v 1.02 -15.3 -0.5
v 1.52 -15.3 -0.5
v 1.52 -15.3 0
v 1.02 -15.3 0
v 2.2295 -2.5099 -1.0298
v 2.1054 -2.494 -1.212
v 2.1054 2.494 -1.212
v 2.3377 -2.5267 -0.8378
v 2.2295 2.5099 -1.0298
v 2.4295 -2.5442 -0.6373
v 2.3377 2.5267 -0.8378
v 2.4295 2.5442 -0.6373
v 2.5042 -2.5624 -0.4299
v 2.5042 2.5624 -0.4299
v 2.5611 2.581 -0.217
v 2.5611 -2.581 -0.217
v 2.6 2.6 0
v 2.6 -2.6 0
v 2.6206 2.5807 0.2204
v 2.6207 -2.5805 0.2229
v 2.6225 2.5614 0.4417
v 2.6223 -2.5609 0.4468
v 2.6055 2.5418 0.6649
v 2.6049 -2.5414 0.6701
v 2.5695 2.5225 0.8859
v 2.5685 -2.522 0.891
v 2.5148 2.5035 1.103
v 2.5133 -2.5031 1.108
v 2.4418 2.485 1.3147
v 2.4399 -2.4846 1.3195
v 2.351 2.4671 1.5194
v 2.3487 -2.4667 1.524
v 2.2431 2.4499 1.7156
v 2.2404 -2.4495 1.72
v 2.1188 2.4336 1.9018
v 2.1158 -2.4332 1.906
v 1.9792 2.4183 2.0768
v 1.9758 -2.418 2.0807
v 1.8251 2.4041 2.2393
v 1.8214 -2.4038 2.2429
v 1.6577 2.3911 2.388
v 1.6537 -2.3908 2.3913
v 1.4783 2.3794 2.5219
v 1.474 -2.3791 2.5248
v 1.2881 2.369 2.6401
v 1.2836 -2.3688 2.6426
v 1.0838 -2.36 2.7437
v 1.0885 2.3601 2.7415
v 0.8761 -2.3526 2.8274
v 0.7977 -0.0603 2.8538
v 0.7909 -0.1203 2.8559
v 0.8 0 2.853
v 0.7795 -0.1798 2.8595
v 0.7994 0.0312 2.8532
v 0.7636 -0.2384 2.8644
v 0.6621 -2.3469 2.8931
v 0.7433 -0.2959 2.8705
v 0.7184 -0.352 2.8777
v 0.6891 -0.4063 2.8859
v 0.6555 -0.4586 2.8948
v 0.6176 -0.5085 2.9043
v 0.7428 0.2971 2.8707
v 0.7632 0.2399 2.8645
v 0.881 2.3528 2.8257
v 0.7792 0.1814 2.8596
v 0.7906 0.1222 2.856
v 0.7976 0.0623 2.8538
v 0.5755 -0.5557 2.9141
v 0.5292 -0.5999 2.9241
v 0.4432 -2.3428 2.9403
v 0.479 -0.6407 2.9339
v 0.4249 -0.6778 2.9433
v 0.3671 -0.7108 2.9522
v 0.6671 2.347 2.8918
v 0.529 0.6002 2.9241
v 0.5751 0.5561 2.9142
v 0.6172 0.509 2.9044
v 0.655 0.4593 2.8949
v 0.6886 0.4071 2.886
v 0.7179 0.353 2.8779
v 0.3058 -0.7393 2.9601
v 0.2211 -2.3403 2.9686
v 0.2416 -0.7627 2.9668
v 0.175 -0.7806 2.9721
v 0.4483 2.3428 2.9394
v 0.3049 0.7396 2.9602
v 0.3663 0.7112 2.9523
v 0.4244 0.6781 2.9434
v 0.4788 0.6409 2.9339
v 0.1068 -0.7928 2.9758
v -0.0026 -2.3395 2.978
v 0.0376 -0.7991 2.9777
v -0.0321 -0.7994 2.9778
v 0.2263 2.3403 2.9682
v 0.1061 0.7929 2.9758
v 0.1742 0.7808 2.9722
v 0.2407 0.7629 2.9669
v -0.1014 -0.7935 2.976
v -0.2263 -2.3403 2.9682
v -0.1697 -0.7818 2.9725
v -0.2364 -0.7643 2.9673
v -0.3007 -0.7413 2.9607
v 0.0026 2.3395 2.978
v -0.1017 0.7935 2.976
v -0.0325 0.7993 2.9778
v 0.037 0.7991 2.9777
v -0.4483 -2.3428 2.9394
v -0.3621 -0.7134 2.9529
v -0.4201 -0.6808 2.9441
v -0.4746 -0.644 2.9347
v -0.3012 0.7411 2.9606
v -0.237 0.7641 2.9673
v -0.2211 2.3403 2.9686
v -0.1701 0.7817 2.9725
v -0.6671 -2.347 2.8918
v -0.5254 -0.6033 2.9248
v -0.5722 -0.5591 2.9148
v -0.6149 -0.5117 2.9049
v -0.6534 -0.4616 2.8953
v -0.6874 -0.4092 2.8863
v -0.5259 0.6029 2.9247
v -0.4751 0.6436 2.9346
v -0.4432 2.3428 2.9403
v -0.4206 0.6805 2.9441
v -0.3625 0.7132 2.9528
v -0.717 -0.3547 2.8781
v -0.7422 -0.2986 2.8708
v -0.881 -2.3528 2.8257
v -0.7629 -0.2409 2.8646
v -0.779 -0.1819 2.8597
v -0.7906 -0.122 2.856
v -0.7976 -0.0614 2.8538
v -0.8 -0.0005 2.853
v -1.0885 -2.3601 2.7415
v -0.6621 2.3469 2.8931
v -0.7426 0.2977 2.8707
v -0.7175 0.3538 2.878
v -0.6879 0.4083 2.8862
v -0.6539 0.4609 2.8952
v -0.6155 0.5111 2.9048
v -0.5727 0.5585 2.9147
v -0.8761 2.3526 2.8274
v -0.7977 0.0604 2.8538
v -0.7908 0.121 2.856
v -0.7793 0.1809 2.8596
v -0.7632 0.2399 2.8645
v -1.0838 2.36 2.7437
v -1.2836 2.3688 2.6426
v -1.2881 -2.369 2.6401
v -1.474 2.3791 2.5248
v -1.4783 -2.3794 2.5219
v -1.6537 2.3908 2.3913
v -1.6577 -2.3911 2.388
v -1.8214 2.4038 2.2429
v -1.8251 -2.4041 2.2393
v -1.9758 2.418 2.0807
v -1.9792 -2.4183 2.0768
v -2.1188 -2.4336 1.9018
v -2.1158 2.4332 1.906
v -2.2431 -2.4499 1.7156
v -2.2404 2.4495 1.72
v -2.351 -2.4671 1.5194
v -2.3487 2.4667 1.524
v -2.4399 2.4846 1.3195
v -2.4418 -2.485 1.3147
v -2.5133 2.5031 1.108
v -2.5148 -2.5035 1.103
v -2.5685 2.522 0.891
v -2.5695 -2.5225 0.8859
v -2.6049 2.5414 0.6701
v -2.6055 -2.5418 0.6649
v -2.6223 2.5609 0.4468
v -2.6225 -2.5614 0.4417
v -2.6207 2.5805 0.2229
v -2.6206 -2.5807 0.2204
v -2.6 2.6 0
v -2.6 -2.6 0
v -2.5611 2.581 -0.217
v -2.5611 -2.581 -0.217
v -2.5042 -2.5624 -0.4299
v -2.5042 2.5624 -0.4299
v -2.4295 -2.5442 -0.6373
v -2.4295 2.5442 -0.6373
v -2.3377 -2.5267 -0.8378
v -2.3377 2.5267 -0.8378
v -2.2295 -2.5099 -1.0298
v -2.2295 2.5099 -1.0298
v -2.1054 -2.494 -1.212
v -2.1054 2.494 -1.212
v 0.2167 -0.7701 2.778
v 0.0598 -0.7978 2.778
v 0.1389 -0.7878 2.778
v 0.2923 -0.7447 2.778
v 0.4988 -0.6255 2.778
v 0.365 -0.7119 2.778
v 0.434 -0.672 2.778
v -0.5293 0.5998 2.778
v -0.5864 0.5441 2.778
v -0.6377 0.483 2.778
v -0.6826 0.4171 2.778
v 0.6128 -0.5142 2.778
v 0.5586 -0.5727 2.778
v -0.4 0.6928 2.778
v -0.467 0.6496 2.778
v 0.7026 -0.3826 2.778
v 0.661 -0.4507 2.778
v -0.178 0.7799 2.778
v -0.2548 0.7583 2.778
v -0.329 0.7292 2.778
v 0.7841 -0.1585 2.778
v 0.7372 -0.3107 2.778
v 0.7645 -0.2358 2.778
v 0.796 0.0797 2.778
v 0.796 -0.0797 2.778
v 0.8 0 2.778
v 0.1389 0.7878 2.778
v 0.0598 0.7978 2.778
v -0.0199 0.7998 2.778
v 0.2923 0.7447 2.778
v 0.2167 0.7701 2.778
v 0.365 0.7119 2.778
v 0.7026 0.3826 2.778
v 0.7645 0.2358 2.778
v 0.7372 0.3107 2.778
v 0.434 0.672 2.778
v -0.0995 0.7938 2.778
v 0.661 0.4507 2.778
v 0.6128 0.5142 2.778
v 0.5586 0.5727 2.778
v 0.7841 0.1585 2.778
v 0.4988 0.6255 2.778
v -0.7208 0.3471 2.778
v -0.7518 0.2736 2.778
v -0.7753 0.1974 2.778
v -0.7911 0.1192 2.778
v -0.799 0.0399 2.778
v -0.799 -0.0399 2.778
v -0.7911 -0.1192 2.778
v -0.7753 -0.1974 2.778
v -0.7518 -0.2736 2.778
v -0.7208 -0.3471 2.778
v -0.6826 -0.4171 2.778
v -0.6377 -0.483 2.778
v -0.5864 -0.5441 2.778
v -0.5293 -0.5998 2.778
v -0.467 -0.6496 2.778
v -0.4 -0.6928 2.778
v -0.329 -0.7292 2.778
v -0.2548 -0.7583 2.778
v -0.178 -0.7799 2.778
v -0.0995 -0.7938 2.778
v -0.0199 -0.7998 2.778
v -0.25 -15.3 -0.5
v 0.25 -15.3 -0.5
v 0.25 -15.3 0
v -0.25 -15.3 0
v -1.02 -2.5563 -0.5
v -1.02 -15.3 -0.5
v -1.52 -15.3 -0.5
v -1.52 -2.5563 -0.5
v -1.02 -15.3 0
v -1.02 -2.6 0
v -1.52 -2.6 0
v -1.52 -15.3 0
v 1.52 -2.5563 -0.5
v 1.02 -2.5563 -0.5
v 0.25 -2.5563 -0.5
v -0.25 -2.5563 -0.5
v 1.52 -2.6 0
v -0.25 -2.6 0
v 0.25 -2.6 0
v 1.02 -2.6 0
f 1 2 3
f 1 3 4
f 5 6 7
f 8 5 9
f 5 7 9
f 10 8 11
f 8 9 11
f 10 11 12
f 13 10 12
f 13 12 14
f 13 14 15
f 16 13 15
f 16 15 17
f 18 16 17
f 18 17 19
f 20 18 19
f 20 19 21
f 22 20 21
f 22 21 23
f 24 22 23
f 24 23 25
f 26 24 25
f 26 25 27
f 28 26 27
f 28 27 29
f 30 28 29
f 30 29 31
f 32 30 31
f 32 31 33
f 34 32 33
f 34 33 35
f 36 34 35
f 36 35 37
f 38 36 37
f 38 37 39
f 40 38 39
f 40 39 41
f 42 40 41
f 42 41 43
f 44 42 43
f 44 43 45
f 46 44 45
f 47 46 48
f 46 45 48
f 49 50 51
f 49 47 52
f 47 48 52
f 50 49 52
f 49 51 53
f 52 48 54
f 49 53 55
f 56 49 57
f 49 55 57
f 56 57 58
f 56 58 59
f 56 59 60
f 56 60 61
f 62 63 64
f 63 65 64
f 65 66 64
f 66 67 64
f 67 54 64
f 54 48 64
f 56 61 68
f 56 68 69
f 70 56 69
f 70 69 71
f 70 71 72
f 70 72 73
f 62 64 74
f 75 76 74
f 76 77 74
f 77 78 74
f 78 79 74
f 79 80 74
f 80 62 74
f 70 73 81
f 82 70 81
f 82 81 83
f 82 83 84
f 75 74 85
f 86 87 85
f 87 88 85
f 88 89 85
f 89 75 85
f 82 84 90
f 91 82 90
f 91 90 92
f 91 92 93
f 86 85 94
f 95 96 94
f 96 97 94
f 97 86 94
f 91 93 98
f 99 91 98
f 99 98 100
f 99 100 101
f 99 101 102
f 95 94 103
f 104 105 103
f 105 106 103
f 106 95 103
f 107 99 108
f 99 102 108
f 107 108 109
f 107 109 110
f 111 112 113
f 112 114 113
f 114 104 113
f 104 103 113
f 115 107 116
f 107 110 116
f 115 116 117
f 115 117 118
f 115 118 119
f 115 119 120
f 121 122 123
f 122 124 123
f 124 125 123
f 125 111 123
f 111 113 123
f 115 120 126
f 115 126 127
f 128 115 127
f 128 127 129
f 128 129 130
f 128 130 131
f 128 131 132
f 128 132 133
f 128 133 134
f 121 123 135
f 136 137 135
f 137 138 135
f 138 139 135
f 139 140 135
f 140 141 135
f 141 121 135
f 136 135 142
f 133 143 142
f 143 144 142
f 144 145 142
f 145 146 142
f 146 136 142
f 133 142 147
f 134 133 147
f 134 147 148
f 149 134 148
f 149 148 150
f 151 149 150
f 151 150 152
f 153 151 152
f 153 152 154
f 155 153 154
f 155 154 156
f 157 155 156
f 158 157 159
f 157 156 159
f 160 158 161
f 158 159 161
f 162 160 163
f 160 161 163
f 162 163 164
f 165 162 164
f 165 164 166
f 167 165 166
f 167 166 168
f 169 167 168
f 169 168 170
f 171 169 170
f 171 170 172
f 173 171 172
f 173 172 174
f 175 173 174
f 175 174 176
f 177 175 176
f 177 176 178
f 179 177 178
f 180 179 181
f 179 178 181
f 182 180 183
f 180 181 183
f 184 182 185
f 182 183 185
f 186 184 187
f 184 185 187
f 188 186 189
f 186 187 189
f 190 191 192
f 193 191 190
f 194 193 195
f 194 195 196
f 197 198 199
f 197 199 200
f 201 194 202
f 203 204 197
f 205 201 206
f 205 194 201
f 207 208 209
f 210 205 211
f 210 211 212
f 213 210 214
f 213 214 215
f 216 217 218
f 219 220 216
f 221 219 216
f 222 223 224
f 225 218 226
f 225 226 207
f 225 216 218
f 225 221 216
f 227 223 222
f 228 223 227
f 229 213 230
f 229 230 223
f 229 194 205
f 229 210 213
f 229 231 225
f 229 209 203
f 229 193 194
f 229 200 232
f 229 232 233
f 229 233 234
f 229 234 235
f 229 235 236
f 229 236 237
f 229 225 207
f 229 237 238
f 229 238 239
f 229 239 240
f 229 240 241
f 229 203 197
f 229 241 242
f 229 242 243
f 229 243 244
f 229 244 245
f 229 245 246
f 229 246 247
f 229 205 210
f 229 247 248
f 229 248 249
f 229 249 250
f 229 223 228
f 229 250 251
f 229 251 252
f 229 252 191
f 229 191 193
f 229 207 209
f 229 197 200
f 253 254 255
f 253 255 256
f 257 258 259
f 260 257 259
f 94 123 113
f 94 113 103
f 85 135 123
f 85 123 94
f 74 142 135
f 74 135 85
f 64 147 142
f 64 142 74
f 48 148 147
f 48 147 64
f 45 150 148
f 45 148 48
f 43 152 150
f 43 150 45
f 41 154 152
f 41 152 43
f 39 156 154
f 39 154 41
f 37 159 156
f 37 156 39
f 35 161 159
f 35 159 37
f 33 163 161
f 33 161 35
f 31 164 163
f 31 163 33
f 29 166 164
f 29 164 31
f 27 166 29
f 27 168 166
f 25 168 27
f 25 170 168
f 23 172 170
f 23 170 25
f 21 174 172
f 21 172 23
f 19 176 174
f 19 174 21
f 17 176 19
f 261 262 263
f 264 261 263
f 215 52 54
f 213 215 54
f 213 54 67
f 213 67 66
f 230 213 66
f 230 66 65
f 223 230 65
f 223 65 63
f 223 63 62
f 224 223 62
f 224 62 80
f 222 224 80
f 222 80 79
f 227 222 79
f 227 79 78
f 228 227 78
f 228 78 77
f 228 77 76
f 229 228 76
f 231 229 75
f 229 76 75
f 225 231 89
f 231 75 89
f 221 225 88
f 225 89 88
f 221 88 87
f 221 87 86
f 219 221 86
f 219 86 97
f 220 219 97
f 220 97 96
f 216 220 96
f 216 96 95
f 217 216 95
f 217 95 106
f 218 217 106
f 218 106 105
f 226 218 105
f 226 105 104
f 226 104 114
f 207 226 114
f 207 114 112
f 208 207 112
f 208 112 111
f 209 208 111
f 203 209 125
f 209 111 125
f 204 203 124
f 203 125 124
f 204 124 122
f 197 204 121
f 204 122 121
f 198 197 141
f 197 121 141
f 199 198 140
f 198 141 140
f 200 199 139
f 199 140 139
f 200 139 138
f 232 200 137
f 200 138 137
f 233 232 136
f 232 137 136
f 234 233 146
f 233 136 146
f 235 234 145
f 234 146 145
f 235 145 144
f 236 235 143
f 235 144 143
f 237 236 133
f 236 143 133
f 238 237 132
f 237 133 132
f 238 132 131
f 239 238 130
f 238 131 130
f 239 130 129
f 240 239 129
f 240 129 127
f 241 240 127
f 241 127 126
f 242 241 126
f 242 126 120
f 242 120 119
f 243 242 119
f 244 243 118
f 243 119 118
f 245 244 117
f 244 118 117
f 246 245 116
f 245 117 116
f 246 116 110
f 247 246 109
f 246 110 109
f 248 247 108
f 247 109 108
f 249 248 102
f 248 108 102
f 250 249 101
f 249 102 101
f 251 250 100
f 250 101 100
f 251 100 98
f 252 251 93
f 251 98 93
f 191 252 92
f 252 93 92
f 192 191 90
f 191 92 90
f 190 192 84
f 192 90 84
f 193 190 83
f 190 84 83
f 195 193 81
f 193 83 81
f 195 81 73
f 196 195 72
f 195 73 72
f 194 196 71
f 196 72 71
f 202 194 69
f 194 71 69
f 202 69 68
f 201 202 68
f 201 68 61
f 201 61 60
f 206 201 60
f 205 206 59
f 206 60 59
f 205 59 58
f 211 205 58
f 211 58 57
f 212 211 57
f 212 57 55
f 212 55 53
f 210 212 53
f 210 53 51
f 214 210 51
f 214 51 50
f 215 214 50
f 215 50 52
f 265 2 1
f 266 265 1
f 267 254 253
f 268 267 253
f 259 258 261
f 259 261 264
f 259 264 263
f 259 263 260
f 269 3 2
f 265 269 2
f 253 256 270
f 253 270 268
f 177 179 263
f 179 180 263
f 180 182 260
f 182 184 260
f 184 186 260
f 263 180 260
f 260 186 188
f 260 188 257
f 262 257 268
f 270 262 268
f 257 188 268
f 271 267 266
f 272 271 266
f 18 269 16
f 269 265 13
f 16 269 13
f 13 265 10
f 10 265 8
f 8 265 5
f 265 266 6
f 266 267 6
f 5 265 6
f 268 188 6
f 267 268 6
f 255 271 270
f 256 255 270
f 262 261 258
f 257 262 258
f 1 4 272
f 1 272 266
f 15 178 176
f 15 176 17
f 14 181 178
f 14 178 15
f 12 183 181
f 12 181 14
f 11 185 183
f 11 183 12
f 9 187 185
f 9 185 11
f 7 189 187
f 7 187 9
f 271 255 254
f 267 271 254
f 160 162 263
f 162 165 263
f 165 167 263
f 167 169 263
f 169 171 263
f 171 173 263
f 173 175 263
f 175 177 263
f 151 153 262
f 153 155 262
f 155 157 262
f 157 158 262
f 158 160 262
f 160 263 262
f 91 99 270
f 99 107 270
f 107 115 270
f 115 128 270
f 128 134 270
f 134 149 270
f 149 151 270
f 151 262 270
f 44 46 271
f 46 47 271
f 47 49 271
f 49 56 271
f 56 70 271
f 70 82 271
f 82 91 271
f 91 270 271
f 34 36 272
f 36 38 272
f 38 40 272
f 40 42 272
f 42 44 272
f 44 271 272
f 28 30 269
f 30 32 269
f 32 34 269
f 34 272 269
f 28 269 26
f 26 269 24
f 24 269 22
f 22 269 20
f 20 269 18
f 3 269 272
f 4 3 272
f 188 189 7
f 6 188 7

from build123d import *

# Parameters (mm, degrees)
BOSS_EXTRUDE1_DEPTH             = 2.6
SKETCH5_W                       = 11.826356456
SKETCH5_H                       = 5.621169426
CUT_EXTRUDE2_DEPTH              = 7.632050589
SKETCH6_W                       = 11.690711404
SKETCH6_H                       = 7.254613366
CUT_EXTRUDE3_DEPTH              = 5.2
SKETCH7_W                       = 0.5
SKETCH7_H                       = 0.5
BOSS_EXTRUDE2_DEPTH             = 12.7
BOSS_EXTRUDE2_DIRECTION_2_REACH = 8.542
SKETCH8_R                       = 0.8
CUT_EXTRUDE4_DEPTH              = 0.2


with BuildPart() as part:
    # Sketch2 → Boss-Extrude1 (new, symmetric)
    with BuildSketch(Plane(origin=(0, 0, 0), x_dir=(1, 0, 0), z_dir=(0, 1, 0))):
        with BuildLine():
            Line((-2.105447518, 1.212026432), (2.105447518, 1.212026432))
            ThreePointArc((2.105447518, 1.212026432), (0, -2.977973568), (-2.105447518, 1.212026432))
        make_face()
    extrude(amount=BOSS_EXTRUDE1_DEPTH, both=True)

    # Sketch5 → Cut-Extrude2 (cut, through all)
    with BuildSketch(Plane(origin=(0, 2.580250079, -0.225742631), x_dir=(1, 0, 0), z_dir=(0, 0.9961946980917455, -0.08715574274765836))):
        with Locations((0.924694538, -0.744658901)):
            Rectangle(SKETCH5_W, SKETCH5_H)
    cut_extrude2 = extrude(amount=CUT_EXTRUDE2_DEPTH, mode=Mode.SUBTRACT)

    # Sketch6 → Cut-Extrude3 (cut)
    with BuildSketch(Plane(origin=(0, 2.580250079, 0.225742631), x_dir=(1, 0, 0), z_dir=(0, 0.9961946980917467, 0.08715574274764504))):
        with Locations((0.257342704, -2.465539164)):
            Rectangle(SKETCH6_W, SKETCH6_H)
    cut_extrude3 = extrude(amount=CUT_EXTRUDE3_DEPTH, mode=Mode.SUBTRACT)

    # Mirror1: Cut-Extrude2, Cut-Extrude3 across plane
    add(cut_extrude2.mirror(Plane.ZX), mode=Mode.SUBTRACT)
    add(cut_extrude3.mirror(Plane.ZX), mode=Mode.SUBTRACT)


with BuildPart() as boss_extrude2_tool:
    # Sketch7 → Boss-Extrude2 (new body)
    with BuildSketch(Plane(origin=(0, -2.6, 0), x_dir=(-1, 0, 0), z_dir=(0, -1, 0))):
        with Locations((-1.27, 0.25)):
            Rectangle(SKETCH7_W, SKETCH7_H)
        with Locations((0, 0.25)):
            Rectangle(SKETCH7_W, SKETCH7_H)
        with Locations((1.27, 0.25)):
            Rectangle(SKETCH7_W, SKETCH7_H)
    extrude(amount=BOSS_EXTRUDE2_DEPTH)


with BuildPart() as part_1:
    add(part.part)


with BuildPart() as part_2:
    # Boss-Extrude2: joined with boss_extrude2_tool
    add(part_1.part.fuse(boss_extrude2_tool.part, tol=0.00001))

    # Sketch7 → Boss-Extrude2 direction 2 (add, up to next)
    with BuildSketch(Plane(origin=(0, -2.6, 0), x_dir=(-1, 0, 0), z_dir=(0, -1, 0)), mode=Mode.PRIVATE) as boss_extrude2_direction_2_sk1:
        with Locations((-1.27, 0.25)):
            Rectangle(SKETCH7_W, SKETCH7_H)
    boss_extrude2_direction_2_tool1 = extrude(boss_extrude2_direction_2_sk1.sketch, amount=-BOSS_EXTRUDE2_DIRECTION_2_REACH, mode=Mode.PRIVATE) - part_2.part
    # Sketch7 → Boss-Extrude2 direction 2 (add, up to next)
    with BuildSketch(Plane(origin=(0, -2.6, 0), x_dir=(-1, 0, 0), z_dir=(0, -1, 0)), mode=Mode.PRIVATE) as boss_extrude2_direction_2_sk2:
        with Locations((0, 0.25)):
            Rectangle(SKETCH7_W, SKETCH7_H)
    boss_extrude2_direction_2_tool2 = extrude(boss_extrude2_direction_2_sk2.sketch, amount=-BOSS_EXTRUDE2_DIRECTION_2_REACH, mode=Mode.PRIVATE) - part_2.part
    # Sketch7 → Boss-Extrude2 direction 2 (add, up to next)
    with BuildSketch(Plane(origin=(0, -2.6, 0), x_dir=(-1, 0, 0), z_dir=(0, -1, 0)), mode=Mode.PRIVATE) as boss_extrude2_direction_2_sk3:
        with Locations((1.27, 0.25)):
            Rectangle(SKETCH7_W, SKETCH7_H)
    boss_extrude2_direction_2_tool3 = extrude(boss_extrude2_direction_2_sk3.sketch, amount=-BOSS_EXTRUDE2_DIRECTION_2_REACH, mode=Mode.PRIVATE) - part_2.part
    add(boss_extrude2_direction_2_tool1.solids().sort_by_distance((1.27, -2.6, -0.25))[0])
    add(boss_extrude2_direction_2_tool2.solids().sort_by_distance((0, -2.6, -0.25))[0])
    add(boss_extrude2_direction_2_tool3.solids().sort_by_distance((-1.27, -2.6, -0.25))[0])

    # Sketch8 → Cut-Extrude4 (cut)
    with BuildSketch(Plane.XY.offset(2.977973568)):
        Circle(SKETCH8_R)
    extrude(amount=-CUT_EXTRUDE4_DEPTH, mode=Mode.SUBTRACT)


solid = part_2.part
